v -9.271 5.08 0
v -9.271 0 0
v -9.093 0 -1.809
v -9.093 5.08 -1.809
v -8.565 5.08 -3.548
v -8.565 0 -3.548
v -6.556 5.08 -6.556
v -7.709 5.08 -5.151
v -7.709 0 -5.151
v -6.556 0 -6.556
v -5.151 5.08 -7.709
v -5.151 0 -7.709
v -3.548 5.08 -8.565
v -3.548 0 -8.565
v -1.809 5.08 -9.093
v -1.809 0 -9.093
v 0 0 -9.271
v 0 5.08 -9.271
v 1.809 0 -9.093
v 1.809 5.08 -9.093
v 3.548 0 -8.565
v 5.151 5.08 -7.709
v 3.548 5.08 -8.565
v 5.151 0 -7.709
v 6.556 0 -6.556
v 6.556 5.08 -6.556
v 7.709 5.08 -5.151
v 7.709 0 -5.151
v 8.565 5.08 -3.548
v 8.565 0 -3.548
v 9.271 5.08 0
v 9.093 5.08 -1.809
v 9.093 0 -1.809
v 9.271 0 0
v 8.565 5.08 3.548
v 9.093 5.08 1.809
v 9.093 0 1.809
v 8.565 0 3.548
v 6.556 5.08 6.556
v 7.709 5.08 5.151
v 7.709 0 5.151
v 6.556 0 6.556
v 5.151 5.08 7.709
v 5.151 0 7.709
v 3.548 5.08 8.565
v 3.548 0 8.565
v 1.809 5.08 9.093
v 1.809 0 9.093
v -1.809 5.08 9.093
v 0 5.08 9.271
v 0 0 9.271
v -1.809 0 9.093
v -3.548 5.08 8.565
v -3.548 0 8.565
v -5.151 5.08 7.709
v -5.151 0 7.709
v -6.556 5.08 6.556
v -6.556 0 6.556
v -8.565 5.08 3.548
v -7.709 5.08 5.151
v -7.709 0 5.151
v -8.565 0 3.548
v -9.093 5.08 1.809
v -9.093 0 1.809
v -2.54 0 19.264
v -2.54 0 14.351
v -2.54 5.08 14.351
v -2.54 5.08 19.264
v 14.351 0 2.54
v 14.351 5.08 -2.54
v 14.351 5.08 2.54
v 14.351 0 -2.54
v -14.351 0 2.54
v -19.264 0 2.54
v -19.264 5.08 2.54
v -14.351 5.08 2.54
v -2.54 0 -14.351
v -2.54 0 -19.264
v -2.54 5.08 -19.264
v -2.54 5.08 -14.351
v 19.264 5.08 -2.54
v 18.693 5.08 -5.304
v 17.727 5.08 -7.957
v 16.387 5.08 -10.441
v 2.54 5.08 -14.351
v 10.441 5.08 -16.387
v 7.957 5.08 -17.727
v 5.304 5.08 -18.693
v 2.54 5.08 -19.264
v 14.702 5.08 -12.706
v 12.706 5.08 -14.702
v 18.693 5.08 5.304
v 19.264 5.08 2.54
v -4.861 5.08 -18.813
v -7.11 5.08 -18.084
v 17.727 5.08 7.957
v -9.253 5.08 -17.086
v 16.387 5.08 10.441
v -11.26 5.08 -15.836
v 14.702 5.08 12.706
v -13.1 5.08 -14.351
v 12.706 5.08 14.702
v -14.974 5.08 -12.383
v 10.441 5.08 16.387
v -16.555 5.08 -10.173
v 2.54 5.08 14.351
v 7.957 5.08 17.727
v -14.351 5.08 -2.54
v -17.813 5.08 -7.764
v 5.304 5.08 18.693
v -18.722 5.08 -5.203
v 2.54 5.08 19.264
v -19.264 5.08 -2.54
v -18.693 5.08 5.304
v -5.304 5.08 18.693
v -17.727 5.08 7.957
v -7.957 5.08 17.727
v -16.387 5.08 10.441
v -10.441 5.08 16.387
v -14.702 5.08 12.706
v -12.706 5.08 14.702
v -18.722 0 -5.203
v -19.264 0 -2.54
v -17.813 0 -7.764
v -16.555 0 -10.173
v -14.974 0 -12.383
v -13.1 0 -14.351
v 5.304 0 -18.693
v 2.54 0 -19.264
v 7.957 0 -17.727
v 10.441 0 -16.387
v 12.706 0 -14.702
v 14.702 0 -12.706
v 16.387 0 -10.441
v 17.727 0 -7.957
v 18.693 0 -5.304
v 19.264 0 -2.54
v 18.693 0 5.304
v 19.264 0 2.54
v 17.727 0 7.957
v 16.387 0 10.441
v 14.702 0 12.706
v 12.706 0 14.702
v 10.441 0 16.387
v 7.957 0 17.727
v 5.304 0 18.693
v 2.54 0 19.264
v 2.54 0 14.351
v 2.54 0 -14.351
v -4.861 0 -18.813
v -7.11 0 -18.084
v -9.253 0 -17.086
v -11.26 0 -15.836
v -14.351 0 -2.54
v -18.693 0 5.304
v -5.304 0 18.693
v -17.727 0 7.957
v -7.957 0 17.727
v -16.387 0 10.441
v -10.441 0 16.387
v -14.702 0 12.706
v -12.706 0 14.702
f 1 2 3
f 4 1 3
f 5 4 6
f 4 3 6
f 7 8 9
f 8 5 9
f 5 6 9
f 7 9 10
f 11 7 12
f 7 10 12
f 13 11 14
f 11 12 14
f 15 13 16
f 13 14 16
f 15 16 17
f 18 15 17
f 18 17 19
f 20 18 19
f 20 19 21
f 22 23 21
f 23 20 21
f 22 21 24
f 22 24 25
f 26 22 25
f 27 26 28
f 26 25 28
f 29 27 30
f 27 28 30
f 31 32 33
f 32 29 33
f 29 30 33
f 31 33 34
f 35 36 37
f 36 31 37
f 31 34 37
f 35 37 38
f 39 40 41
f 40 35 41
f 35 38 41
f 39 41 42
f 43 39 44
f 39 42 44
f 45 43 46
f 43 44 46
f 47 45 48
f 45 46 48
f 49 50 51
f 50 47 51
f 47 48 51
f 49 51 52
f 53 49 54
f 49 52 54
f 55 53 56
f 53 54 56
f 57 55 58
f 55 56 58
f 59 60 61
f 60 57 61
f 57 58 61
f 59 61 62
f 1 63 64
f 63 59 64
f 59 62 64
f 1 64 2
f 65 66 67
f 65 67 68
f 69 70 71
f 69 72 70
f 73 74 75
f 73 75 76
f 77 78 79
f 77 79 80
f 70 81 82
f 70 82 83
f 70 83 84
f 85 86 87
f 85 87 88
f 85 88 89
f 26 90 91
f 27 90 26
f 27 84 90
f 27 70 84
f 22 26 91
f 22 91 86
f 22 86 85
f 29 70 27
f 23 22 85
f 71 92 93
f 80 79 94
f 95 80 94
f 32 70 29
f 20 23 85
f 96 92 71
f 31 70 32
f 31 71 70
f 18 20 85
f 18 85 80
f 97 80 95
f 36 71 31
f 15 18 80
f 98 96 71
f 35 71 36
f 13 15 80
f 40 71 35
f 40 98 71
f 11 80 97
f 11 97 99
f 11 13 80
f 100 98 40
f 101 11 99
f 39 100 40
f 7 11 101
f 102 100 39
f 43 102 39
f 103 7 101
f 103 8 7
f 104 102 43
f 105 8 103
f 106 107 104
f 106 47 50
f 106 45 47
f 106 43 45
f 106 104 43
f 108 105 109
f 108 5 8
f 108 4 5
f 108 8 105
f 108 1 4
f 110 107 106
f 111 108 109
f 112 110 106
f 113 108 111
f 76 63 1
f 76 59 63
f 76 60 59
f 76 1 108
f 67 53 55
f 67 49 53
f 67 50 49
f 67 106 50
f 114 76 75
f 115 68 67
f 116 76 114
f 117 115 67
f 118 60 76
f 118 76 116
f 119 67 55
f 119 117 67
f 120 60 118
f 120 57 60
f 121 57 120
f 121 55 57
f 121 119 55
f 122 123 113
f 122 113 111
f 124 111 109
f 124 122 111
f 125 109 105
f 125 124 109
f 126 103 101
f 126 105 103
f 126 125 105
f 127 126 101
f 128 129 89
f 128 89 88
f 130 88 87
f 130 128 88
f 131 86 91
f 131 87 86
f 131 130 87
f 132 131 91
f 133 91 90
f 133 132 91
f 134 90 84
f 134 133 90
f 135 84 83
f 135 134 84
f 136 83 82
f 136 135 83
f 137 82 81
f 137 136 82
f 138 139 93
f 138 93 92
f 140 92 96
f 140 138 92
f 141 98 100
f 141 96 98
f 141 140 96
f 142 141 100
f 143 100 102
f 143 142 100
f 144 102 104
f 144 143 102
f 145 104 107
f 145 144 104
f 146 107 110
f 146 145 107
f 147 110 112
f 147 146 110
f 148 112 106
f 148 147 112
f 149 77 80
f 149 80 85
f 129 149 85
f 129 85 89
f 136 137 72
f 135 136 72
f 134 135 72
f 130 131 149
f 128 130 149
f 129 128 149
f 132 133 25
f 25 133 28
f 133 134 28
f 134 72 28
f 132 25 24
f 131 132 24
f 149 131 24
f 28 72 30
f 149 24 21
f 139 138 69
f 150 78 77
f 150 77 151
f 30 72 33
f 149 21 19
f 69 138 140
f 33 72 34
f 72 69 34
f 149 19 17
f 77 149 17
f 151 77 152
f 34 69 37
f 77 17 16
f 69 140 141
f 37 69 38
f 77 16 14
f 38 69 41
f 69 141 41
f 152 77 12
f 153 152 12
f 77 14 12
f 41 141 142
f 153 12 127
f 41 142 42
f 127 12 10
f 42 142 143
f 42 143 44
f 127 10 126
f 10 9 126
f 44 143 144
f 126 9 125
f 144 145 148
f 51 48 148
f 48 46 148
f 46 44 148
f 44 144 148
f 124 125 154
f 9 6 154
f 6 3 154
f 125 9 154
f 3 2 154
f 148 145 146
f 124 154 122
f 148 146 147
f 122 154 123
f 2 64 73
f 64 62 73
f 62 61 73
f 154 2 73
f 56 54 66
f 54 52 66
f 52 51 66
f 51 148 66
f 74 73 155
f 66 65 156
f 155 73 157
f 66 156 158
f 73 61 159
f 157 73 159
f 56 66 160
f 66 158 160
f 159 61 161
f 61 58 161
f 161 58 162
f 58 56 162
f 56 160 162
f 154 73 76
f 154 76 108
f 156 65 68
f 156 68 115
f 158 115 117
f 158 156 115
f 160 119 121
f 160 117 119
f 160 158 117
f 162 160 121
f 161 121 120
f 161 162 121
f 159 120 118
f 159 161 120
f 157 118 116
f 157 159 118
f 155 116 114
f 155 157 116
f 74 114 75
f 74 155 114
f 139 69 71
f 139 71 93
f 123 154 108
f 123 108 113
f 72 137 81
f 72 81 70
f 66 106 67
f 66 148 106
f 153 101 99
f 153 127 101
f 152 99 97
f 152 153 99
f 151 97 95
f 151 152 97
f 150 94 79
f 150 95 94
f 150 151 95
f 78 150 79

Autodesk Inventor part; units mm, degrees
ref_plane "YZ Plane" through (0, 0, 0) normal (1, 0, 0) x (0, 1, 0)
ref_plane "XZ Plane" through (0, 0, 0) normal (0, 1, 0) x (-1, 0, 0)
ref_plane "XY Plane" through (0, 0, 0) normal (0, 0, 1) x (1, 0, 0)
sketch "Sketch1" plane through (0, 0, 0) normal (0, 1, 0) x (-1, 0, 0)
  circle A0 centre (0, 0) radius 9.271
  arc A1 (19.2643, -2.54) -> (19.2643, 2.54) centre (0, 0) ccw
  line L0 (19.431, 2.54) -> (14.351, 2.54)
  line L1 (14.351, 2.54) -> (14.351, -2.54)
  line L2 (14.351, -2.54) -> (19.431, -2.54)
  line L3 (19.431, -2.54) -> (19.431, 2.54)
  line L4 (19.431, 0) -> (0, 0) construction
  line L5 (-2.54, 19.431) -> (-2.54, 14.351)
  line L6 (-2.54, 14.351) -> (2.54, 14.351)
  line L7 (2.54, 14.351) -> (2.54, 19.431)
  line L8 (2.54, 19.431) -> (-2.54, 19.431)
  line L9 (-19.431, -2.54) -> (-14.351, -2.54)
  line L10 (-14.351, -2.54) -> (-14.351, 2.54)
  line L11 (-14.351, 2.54) -> (-19.431, 2.54)
  line L12 (-19.431, 2.54) -> (-19.431, -2.54)
  line L13 (2.54, -19.431) -> (2.54, -14.351)
  line L14 (2.54, -14.351) -> (-2.54, -14.351)
  line L15 (-2.54, -14.351) -> (-2.54, -19.431)
  line L16 (-2.54, -19.431) -> (2.54, -19.431)
  arc A2 (2.54, -19.2643) -> (13.1001, -14.351) centre (0, 0) ccw
  arc A3 (19.2643, 2.54) -> (2.54, 19.2643) centre (0, 0) ccw
  arc A4 (-19.2643, 2.54) -> (-19.2643, -2.54) centre (0, 0) ccw
  arc A5 (-19.2643, -2.54) -> (-2.54, -19.2643) centre (0, 0) ccw
  arc A6 (2.54, 19.2643) -> (-2.54, 19.2643) centre (0, 0) ccw
  arc A7 (-2.54, 19.2643) -> (-19.2643, 2.54) centre (0, 0) ccw
  arc A8 (13.1001, -14.351) -> (19.2643, -2.54) centre (0, 0) ccw
  arc A9 (-2.54, -19.2643) -> (2.54, -19.2643) centre (0, 0) ccw
  point P0 (0, 19.431)
  point P1 (-19.431, 0)
  point P2 (0, -19.431)
  dimension "d0" = 18.542
  dimension "d1" = 38.862
  dimension "d2" = 5.08
  dimension "d3" = 5.08
  dimension "d6" = 360
extrude "Extrusion1" add sketch "Sketch1" along normal blind 5.08 contours A8 A2 L13 L14 L15 A5 L9 L10 L11 A7 L5 L6 L7 A3 L0 L1 L2
properties part number "MarkerRing" material "Wood (Birch)"
